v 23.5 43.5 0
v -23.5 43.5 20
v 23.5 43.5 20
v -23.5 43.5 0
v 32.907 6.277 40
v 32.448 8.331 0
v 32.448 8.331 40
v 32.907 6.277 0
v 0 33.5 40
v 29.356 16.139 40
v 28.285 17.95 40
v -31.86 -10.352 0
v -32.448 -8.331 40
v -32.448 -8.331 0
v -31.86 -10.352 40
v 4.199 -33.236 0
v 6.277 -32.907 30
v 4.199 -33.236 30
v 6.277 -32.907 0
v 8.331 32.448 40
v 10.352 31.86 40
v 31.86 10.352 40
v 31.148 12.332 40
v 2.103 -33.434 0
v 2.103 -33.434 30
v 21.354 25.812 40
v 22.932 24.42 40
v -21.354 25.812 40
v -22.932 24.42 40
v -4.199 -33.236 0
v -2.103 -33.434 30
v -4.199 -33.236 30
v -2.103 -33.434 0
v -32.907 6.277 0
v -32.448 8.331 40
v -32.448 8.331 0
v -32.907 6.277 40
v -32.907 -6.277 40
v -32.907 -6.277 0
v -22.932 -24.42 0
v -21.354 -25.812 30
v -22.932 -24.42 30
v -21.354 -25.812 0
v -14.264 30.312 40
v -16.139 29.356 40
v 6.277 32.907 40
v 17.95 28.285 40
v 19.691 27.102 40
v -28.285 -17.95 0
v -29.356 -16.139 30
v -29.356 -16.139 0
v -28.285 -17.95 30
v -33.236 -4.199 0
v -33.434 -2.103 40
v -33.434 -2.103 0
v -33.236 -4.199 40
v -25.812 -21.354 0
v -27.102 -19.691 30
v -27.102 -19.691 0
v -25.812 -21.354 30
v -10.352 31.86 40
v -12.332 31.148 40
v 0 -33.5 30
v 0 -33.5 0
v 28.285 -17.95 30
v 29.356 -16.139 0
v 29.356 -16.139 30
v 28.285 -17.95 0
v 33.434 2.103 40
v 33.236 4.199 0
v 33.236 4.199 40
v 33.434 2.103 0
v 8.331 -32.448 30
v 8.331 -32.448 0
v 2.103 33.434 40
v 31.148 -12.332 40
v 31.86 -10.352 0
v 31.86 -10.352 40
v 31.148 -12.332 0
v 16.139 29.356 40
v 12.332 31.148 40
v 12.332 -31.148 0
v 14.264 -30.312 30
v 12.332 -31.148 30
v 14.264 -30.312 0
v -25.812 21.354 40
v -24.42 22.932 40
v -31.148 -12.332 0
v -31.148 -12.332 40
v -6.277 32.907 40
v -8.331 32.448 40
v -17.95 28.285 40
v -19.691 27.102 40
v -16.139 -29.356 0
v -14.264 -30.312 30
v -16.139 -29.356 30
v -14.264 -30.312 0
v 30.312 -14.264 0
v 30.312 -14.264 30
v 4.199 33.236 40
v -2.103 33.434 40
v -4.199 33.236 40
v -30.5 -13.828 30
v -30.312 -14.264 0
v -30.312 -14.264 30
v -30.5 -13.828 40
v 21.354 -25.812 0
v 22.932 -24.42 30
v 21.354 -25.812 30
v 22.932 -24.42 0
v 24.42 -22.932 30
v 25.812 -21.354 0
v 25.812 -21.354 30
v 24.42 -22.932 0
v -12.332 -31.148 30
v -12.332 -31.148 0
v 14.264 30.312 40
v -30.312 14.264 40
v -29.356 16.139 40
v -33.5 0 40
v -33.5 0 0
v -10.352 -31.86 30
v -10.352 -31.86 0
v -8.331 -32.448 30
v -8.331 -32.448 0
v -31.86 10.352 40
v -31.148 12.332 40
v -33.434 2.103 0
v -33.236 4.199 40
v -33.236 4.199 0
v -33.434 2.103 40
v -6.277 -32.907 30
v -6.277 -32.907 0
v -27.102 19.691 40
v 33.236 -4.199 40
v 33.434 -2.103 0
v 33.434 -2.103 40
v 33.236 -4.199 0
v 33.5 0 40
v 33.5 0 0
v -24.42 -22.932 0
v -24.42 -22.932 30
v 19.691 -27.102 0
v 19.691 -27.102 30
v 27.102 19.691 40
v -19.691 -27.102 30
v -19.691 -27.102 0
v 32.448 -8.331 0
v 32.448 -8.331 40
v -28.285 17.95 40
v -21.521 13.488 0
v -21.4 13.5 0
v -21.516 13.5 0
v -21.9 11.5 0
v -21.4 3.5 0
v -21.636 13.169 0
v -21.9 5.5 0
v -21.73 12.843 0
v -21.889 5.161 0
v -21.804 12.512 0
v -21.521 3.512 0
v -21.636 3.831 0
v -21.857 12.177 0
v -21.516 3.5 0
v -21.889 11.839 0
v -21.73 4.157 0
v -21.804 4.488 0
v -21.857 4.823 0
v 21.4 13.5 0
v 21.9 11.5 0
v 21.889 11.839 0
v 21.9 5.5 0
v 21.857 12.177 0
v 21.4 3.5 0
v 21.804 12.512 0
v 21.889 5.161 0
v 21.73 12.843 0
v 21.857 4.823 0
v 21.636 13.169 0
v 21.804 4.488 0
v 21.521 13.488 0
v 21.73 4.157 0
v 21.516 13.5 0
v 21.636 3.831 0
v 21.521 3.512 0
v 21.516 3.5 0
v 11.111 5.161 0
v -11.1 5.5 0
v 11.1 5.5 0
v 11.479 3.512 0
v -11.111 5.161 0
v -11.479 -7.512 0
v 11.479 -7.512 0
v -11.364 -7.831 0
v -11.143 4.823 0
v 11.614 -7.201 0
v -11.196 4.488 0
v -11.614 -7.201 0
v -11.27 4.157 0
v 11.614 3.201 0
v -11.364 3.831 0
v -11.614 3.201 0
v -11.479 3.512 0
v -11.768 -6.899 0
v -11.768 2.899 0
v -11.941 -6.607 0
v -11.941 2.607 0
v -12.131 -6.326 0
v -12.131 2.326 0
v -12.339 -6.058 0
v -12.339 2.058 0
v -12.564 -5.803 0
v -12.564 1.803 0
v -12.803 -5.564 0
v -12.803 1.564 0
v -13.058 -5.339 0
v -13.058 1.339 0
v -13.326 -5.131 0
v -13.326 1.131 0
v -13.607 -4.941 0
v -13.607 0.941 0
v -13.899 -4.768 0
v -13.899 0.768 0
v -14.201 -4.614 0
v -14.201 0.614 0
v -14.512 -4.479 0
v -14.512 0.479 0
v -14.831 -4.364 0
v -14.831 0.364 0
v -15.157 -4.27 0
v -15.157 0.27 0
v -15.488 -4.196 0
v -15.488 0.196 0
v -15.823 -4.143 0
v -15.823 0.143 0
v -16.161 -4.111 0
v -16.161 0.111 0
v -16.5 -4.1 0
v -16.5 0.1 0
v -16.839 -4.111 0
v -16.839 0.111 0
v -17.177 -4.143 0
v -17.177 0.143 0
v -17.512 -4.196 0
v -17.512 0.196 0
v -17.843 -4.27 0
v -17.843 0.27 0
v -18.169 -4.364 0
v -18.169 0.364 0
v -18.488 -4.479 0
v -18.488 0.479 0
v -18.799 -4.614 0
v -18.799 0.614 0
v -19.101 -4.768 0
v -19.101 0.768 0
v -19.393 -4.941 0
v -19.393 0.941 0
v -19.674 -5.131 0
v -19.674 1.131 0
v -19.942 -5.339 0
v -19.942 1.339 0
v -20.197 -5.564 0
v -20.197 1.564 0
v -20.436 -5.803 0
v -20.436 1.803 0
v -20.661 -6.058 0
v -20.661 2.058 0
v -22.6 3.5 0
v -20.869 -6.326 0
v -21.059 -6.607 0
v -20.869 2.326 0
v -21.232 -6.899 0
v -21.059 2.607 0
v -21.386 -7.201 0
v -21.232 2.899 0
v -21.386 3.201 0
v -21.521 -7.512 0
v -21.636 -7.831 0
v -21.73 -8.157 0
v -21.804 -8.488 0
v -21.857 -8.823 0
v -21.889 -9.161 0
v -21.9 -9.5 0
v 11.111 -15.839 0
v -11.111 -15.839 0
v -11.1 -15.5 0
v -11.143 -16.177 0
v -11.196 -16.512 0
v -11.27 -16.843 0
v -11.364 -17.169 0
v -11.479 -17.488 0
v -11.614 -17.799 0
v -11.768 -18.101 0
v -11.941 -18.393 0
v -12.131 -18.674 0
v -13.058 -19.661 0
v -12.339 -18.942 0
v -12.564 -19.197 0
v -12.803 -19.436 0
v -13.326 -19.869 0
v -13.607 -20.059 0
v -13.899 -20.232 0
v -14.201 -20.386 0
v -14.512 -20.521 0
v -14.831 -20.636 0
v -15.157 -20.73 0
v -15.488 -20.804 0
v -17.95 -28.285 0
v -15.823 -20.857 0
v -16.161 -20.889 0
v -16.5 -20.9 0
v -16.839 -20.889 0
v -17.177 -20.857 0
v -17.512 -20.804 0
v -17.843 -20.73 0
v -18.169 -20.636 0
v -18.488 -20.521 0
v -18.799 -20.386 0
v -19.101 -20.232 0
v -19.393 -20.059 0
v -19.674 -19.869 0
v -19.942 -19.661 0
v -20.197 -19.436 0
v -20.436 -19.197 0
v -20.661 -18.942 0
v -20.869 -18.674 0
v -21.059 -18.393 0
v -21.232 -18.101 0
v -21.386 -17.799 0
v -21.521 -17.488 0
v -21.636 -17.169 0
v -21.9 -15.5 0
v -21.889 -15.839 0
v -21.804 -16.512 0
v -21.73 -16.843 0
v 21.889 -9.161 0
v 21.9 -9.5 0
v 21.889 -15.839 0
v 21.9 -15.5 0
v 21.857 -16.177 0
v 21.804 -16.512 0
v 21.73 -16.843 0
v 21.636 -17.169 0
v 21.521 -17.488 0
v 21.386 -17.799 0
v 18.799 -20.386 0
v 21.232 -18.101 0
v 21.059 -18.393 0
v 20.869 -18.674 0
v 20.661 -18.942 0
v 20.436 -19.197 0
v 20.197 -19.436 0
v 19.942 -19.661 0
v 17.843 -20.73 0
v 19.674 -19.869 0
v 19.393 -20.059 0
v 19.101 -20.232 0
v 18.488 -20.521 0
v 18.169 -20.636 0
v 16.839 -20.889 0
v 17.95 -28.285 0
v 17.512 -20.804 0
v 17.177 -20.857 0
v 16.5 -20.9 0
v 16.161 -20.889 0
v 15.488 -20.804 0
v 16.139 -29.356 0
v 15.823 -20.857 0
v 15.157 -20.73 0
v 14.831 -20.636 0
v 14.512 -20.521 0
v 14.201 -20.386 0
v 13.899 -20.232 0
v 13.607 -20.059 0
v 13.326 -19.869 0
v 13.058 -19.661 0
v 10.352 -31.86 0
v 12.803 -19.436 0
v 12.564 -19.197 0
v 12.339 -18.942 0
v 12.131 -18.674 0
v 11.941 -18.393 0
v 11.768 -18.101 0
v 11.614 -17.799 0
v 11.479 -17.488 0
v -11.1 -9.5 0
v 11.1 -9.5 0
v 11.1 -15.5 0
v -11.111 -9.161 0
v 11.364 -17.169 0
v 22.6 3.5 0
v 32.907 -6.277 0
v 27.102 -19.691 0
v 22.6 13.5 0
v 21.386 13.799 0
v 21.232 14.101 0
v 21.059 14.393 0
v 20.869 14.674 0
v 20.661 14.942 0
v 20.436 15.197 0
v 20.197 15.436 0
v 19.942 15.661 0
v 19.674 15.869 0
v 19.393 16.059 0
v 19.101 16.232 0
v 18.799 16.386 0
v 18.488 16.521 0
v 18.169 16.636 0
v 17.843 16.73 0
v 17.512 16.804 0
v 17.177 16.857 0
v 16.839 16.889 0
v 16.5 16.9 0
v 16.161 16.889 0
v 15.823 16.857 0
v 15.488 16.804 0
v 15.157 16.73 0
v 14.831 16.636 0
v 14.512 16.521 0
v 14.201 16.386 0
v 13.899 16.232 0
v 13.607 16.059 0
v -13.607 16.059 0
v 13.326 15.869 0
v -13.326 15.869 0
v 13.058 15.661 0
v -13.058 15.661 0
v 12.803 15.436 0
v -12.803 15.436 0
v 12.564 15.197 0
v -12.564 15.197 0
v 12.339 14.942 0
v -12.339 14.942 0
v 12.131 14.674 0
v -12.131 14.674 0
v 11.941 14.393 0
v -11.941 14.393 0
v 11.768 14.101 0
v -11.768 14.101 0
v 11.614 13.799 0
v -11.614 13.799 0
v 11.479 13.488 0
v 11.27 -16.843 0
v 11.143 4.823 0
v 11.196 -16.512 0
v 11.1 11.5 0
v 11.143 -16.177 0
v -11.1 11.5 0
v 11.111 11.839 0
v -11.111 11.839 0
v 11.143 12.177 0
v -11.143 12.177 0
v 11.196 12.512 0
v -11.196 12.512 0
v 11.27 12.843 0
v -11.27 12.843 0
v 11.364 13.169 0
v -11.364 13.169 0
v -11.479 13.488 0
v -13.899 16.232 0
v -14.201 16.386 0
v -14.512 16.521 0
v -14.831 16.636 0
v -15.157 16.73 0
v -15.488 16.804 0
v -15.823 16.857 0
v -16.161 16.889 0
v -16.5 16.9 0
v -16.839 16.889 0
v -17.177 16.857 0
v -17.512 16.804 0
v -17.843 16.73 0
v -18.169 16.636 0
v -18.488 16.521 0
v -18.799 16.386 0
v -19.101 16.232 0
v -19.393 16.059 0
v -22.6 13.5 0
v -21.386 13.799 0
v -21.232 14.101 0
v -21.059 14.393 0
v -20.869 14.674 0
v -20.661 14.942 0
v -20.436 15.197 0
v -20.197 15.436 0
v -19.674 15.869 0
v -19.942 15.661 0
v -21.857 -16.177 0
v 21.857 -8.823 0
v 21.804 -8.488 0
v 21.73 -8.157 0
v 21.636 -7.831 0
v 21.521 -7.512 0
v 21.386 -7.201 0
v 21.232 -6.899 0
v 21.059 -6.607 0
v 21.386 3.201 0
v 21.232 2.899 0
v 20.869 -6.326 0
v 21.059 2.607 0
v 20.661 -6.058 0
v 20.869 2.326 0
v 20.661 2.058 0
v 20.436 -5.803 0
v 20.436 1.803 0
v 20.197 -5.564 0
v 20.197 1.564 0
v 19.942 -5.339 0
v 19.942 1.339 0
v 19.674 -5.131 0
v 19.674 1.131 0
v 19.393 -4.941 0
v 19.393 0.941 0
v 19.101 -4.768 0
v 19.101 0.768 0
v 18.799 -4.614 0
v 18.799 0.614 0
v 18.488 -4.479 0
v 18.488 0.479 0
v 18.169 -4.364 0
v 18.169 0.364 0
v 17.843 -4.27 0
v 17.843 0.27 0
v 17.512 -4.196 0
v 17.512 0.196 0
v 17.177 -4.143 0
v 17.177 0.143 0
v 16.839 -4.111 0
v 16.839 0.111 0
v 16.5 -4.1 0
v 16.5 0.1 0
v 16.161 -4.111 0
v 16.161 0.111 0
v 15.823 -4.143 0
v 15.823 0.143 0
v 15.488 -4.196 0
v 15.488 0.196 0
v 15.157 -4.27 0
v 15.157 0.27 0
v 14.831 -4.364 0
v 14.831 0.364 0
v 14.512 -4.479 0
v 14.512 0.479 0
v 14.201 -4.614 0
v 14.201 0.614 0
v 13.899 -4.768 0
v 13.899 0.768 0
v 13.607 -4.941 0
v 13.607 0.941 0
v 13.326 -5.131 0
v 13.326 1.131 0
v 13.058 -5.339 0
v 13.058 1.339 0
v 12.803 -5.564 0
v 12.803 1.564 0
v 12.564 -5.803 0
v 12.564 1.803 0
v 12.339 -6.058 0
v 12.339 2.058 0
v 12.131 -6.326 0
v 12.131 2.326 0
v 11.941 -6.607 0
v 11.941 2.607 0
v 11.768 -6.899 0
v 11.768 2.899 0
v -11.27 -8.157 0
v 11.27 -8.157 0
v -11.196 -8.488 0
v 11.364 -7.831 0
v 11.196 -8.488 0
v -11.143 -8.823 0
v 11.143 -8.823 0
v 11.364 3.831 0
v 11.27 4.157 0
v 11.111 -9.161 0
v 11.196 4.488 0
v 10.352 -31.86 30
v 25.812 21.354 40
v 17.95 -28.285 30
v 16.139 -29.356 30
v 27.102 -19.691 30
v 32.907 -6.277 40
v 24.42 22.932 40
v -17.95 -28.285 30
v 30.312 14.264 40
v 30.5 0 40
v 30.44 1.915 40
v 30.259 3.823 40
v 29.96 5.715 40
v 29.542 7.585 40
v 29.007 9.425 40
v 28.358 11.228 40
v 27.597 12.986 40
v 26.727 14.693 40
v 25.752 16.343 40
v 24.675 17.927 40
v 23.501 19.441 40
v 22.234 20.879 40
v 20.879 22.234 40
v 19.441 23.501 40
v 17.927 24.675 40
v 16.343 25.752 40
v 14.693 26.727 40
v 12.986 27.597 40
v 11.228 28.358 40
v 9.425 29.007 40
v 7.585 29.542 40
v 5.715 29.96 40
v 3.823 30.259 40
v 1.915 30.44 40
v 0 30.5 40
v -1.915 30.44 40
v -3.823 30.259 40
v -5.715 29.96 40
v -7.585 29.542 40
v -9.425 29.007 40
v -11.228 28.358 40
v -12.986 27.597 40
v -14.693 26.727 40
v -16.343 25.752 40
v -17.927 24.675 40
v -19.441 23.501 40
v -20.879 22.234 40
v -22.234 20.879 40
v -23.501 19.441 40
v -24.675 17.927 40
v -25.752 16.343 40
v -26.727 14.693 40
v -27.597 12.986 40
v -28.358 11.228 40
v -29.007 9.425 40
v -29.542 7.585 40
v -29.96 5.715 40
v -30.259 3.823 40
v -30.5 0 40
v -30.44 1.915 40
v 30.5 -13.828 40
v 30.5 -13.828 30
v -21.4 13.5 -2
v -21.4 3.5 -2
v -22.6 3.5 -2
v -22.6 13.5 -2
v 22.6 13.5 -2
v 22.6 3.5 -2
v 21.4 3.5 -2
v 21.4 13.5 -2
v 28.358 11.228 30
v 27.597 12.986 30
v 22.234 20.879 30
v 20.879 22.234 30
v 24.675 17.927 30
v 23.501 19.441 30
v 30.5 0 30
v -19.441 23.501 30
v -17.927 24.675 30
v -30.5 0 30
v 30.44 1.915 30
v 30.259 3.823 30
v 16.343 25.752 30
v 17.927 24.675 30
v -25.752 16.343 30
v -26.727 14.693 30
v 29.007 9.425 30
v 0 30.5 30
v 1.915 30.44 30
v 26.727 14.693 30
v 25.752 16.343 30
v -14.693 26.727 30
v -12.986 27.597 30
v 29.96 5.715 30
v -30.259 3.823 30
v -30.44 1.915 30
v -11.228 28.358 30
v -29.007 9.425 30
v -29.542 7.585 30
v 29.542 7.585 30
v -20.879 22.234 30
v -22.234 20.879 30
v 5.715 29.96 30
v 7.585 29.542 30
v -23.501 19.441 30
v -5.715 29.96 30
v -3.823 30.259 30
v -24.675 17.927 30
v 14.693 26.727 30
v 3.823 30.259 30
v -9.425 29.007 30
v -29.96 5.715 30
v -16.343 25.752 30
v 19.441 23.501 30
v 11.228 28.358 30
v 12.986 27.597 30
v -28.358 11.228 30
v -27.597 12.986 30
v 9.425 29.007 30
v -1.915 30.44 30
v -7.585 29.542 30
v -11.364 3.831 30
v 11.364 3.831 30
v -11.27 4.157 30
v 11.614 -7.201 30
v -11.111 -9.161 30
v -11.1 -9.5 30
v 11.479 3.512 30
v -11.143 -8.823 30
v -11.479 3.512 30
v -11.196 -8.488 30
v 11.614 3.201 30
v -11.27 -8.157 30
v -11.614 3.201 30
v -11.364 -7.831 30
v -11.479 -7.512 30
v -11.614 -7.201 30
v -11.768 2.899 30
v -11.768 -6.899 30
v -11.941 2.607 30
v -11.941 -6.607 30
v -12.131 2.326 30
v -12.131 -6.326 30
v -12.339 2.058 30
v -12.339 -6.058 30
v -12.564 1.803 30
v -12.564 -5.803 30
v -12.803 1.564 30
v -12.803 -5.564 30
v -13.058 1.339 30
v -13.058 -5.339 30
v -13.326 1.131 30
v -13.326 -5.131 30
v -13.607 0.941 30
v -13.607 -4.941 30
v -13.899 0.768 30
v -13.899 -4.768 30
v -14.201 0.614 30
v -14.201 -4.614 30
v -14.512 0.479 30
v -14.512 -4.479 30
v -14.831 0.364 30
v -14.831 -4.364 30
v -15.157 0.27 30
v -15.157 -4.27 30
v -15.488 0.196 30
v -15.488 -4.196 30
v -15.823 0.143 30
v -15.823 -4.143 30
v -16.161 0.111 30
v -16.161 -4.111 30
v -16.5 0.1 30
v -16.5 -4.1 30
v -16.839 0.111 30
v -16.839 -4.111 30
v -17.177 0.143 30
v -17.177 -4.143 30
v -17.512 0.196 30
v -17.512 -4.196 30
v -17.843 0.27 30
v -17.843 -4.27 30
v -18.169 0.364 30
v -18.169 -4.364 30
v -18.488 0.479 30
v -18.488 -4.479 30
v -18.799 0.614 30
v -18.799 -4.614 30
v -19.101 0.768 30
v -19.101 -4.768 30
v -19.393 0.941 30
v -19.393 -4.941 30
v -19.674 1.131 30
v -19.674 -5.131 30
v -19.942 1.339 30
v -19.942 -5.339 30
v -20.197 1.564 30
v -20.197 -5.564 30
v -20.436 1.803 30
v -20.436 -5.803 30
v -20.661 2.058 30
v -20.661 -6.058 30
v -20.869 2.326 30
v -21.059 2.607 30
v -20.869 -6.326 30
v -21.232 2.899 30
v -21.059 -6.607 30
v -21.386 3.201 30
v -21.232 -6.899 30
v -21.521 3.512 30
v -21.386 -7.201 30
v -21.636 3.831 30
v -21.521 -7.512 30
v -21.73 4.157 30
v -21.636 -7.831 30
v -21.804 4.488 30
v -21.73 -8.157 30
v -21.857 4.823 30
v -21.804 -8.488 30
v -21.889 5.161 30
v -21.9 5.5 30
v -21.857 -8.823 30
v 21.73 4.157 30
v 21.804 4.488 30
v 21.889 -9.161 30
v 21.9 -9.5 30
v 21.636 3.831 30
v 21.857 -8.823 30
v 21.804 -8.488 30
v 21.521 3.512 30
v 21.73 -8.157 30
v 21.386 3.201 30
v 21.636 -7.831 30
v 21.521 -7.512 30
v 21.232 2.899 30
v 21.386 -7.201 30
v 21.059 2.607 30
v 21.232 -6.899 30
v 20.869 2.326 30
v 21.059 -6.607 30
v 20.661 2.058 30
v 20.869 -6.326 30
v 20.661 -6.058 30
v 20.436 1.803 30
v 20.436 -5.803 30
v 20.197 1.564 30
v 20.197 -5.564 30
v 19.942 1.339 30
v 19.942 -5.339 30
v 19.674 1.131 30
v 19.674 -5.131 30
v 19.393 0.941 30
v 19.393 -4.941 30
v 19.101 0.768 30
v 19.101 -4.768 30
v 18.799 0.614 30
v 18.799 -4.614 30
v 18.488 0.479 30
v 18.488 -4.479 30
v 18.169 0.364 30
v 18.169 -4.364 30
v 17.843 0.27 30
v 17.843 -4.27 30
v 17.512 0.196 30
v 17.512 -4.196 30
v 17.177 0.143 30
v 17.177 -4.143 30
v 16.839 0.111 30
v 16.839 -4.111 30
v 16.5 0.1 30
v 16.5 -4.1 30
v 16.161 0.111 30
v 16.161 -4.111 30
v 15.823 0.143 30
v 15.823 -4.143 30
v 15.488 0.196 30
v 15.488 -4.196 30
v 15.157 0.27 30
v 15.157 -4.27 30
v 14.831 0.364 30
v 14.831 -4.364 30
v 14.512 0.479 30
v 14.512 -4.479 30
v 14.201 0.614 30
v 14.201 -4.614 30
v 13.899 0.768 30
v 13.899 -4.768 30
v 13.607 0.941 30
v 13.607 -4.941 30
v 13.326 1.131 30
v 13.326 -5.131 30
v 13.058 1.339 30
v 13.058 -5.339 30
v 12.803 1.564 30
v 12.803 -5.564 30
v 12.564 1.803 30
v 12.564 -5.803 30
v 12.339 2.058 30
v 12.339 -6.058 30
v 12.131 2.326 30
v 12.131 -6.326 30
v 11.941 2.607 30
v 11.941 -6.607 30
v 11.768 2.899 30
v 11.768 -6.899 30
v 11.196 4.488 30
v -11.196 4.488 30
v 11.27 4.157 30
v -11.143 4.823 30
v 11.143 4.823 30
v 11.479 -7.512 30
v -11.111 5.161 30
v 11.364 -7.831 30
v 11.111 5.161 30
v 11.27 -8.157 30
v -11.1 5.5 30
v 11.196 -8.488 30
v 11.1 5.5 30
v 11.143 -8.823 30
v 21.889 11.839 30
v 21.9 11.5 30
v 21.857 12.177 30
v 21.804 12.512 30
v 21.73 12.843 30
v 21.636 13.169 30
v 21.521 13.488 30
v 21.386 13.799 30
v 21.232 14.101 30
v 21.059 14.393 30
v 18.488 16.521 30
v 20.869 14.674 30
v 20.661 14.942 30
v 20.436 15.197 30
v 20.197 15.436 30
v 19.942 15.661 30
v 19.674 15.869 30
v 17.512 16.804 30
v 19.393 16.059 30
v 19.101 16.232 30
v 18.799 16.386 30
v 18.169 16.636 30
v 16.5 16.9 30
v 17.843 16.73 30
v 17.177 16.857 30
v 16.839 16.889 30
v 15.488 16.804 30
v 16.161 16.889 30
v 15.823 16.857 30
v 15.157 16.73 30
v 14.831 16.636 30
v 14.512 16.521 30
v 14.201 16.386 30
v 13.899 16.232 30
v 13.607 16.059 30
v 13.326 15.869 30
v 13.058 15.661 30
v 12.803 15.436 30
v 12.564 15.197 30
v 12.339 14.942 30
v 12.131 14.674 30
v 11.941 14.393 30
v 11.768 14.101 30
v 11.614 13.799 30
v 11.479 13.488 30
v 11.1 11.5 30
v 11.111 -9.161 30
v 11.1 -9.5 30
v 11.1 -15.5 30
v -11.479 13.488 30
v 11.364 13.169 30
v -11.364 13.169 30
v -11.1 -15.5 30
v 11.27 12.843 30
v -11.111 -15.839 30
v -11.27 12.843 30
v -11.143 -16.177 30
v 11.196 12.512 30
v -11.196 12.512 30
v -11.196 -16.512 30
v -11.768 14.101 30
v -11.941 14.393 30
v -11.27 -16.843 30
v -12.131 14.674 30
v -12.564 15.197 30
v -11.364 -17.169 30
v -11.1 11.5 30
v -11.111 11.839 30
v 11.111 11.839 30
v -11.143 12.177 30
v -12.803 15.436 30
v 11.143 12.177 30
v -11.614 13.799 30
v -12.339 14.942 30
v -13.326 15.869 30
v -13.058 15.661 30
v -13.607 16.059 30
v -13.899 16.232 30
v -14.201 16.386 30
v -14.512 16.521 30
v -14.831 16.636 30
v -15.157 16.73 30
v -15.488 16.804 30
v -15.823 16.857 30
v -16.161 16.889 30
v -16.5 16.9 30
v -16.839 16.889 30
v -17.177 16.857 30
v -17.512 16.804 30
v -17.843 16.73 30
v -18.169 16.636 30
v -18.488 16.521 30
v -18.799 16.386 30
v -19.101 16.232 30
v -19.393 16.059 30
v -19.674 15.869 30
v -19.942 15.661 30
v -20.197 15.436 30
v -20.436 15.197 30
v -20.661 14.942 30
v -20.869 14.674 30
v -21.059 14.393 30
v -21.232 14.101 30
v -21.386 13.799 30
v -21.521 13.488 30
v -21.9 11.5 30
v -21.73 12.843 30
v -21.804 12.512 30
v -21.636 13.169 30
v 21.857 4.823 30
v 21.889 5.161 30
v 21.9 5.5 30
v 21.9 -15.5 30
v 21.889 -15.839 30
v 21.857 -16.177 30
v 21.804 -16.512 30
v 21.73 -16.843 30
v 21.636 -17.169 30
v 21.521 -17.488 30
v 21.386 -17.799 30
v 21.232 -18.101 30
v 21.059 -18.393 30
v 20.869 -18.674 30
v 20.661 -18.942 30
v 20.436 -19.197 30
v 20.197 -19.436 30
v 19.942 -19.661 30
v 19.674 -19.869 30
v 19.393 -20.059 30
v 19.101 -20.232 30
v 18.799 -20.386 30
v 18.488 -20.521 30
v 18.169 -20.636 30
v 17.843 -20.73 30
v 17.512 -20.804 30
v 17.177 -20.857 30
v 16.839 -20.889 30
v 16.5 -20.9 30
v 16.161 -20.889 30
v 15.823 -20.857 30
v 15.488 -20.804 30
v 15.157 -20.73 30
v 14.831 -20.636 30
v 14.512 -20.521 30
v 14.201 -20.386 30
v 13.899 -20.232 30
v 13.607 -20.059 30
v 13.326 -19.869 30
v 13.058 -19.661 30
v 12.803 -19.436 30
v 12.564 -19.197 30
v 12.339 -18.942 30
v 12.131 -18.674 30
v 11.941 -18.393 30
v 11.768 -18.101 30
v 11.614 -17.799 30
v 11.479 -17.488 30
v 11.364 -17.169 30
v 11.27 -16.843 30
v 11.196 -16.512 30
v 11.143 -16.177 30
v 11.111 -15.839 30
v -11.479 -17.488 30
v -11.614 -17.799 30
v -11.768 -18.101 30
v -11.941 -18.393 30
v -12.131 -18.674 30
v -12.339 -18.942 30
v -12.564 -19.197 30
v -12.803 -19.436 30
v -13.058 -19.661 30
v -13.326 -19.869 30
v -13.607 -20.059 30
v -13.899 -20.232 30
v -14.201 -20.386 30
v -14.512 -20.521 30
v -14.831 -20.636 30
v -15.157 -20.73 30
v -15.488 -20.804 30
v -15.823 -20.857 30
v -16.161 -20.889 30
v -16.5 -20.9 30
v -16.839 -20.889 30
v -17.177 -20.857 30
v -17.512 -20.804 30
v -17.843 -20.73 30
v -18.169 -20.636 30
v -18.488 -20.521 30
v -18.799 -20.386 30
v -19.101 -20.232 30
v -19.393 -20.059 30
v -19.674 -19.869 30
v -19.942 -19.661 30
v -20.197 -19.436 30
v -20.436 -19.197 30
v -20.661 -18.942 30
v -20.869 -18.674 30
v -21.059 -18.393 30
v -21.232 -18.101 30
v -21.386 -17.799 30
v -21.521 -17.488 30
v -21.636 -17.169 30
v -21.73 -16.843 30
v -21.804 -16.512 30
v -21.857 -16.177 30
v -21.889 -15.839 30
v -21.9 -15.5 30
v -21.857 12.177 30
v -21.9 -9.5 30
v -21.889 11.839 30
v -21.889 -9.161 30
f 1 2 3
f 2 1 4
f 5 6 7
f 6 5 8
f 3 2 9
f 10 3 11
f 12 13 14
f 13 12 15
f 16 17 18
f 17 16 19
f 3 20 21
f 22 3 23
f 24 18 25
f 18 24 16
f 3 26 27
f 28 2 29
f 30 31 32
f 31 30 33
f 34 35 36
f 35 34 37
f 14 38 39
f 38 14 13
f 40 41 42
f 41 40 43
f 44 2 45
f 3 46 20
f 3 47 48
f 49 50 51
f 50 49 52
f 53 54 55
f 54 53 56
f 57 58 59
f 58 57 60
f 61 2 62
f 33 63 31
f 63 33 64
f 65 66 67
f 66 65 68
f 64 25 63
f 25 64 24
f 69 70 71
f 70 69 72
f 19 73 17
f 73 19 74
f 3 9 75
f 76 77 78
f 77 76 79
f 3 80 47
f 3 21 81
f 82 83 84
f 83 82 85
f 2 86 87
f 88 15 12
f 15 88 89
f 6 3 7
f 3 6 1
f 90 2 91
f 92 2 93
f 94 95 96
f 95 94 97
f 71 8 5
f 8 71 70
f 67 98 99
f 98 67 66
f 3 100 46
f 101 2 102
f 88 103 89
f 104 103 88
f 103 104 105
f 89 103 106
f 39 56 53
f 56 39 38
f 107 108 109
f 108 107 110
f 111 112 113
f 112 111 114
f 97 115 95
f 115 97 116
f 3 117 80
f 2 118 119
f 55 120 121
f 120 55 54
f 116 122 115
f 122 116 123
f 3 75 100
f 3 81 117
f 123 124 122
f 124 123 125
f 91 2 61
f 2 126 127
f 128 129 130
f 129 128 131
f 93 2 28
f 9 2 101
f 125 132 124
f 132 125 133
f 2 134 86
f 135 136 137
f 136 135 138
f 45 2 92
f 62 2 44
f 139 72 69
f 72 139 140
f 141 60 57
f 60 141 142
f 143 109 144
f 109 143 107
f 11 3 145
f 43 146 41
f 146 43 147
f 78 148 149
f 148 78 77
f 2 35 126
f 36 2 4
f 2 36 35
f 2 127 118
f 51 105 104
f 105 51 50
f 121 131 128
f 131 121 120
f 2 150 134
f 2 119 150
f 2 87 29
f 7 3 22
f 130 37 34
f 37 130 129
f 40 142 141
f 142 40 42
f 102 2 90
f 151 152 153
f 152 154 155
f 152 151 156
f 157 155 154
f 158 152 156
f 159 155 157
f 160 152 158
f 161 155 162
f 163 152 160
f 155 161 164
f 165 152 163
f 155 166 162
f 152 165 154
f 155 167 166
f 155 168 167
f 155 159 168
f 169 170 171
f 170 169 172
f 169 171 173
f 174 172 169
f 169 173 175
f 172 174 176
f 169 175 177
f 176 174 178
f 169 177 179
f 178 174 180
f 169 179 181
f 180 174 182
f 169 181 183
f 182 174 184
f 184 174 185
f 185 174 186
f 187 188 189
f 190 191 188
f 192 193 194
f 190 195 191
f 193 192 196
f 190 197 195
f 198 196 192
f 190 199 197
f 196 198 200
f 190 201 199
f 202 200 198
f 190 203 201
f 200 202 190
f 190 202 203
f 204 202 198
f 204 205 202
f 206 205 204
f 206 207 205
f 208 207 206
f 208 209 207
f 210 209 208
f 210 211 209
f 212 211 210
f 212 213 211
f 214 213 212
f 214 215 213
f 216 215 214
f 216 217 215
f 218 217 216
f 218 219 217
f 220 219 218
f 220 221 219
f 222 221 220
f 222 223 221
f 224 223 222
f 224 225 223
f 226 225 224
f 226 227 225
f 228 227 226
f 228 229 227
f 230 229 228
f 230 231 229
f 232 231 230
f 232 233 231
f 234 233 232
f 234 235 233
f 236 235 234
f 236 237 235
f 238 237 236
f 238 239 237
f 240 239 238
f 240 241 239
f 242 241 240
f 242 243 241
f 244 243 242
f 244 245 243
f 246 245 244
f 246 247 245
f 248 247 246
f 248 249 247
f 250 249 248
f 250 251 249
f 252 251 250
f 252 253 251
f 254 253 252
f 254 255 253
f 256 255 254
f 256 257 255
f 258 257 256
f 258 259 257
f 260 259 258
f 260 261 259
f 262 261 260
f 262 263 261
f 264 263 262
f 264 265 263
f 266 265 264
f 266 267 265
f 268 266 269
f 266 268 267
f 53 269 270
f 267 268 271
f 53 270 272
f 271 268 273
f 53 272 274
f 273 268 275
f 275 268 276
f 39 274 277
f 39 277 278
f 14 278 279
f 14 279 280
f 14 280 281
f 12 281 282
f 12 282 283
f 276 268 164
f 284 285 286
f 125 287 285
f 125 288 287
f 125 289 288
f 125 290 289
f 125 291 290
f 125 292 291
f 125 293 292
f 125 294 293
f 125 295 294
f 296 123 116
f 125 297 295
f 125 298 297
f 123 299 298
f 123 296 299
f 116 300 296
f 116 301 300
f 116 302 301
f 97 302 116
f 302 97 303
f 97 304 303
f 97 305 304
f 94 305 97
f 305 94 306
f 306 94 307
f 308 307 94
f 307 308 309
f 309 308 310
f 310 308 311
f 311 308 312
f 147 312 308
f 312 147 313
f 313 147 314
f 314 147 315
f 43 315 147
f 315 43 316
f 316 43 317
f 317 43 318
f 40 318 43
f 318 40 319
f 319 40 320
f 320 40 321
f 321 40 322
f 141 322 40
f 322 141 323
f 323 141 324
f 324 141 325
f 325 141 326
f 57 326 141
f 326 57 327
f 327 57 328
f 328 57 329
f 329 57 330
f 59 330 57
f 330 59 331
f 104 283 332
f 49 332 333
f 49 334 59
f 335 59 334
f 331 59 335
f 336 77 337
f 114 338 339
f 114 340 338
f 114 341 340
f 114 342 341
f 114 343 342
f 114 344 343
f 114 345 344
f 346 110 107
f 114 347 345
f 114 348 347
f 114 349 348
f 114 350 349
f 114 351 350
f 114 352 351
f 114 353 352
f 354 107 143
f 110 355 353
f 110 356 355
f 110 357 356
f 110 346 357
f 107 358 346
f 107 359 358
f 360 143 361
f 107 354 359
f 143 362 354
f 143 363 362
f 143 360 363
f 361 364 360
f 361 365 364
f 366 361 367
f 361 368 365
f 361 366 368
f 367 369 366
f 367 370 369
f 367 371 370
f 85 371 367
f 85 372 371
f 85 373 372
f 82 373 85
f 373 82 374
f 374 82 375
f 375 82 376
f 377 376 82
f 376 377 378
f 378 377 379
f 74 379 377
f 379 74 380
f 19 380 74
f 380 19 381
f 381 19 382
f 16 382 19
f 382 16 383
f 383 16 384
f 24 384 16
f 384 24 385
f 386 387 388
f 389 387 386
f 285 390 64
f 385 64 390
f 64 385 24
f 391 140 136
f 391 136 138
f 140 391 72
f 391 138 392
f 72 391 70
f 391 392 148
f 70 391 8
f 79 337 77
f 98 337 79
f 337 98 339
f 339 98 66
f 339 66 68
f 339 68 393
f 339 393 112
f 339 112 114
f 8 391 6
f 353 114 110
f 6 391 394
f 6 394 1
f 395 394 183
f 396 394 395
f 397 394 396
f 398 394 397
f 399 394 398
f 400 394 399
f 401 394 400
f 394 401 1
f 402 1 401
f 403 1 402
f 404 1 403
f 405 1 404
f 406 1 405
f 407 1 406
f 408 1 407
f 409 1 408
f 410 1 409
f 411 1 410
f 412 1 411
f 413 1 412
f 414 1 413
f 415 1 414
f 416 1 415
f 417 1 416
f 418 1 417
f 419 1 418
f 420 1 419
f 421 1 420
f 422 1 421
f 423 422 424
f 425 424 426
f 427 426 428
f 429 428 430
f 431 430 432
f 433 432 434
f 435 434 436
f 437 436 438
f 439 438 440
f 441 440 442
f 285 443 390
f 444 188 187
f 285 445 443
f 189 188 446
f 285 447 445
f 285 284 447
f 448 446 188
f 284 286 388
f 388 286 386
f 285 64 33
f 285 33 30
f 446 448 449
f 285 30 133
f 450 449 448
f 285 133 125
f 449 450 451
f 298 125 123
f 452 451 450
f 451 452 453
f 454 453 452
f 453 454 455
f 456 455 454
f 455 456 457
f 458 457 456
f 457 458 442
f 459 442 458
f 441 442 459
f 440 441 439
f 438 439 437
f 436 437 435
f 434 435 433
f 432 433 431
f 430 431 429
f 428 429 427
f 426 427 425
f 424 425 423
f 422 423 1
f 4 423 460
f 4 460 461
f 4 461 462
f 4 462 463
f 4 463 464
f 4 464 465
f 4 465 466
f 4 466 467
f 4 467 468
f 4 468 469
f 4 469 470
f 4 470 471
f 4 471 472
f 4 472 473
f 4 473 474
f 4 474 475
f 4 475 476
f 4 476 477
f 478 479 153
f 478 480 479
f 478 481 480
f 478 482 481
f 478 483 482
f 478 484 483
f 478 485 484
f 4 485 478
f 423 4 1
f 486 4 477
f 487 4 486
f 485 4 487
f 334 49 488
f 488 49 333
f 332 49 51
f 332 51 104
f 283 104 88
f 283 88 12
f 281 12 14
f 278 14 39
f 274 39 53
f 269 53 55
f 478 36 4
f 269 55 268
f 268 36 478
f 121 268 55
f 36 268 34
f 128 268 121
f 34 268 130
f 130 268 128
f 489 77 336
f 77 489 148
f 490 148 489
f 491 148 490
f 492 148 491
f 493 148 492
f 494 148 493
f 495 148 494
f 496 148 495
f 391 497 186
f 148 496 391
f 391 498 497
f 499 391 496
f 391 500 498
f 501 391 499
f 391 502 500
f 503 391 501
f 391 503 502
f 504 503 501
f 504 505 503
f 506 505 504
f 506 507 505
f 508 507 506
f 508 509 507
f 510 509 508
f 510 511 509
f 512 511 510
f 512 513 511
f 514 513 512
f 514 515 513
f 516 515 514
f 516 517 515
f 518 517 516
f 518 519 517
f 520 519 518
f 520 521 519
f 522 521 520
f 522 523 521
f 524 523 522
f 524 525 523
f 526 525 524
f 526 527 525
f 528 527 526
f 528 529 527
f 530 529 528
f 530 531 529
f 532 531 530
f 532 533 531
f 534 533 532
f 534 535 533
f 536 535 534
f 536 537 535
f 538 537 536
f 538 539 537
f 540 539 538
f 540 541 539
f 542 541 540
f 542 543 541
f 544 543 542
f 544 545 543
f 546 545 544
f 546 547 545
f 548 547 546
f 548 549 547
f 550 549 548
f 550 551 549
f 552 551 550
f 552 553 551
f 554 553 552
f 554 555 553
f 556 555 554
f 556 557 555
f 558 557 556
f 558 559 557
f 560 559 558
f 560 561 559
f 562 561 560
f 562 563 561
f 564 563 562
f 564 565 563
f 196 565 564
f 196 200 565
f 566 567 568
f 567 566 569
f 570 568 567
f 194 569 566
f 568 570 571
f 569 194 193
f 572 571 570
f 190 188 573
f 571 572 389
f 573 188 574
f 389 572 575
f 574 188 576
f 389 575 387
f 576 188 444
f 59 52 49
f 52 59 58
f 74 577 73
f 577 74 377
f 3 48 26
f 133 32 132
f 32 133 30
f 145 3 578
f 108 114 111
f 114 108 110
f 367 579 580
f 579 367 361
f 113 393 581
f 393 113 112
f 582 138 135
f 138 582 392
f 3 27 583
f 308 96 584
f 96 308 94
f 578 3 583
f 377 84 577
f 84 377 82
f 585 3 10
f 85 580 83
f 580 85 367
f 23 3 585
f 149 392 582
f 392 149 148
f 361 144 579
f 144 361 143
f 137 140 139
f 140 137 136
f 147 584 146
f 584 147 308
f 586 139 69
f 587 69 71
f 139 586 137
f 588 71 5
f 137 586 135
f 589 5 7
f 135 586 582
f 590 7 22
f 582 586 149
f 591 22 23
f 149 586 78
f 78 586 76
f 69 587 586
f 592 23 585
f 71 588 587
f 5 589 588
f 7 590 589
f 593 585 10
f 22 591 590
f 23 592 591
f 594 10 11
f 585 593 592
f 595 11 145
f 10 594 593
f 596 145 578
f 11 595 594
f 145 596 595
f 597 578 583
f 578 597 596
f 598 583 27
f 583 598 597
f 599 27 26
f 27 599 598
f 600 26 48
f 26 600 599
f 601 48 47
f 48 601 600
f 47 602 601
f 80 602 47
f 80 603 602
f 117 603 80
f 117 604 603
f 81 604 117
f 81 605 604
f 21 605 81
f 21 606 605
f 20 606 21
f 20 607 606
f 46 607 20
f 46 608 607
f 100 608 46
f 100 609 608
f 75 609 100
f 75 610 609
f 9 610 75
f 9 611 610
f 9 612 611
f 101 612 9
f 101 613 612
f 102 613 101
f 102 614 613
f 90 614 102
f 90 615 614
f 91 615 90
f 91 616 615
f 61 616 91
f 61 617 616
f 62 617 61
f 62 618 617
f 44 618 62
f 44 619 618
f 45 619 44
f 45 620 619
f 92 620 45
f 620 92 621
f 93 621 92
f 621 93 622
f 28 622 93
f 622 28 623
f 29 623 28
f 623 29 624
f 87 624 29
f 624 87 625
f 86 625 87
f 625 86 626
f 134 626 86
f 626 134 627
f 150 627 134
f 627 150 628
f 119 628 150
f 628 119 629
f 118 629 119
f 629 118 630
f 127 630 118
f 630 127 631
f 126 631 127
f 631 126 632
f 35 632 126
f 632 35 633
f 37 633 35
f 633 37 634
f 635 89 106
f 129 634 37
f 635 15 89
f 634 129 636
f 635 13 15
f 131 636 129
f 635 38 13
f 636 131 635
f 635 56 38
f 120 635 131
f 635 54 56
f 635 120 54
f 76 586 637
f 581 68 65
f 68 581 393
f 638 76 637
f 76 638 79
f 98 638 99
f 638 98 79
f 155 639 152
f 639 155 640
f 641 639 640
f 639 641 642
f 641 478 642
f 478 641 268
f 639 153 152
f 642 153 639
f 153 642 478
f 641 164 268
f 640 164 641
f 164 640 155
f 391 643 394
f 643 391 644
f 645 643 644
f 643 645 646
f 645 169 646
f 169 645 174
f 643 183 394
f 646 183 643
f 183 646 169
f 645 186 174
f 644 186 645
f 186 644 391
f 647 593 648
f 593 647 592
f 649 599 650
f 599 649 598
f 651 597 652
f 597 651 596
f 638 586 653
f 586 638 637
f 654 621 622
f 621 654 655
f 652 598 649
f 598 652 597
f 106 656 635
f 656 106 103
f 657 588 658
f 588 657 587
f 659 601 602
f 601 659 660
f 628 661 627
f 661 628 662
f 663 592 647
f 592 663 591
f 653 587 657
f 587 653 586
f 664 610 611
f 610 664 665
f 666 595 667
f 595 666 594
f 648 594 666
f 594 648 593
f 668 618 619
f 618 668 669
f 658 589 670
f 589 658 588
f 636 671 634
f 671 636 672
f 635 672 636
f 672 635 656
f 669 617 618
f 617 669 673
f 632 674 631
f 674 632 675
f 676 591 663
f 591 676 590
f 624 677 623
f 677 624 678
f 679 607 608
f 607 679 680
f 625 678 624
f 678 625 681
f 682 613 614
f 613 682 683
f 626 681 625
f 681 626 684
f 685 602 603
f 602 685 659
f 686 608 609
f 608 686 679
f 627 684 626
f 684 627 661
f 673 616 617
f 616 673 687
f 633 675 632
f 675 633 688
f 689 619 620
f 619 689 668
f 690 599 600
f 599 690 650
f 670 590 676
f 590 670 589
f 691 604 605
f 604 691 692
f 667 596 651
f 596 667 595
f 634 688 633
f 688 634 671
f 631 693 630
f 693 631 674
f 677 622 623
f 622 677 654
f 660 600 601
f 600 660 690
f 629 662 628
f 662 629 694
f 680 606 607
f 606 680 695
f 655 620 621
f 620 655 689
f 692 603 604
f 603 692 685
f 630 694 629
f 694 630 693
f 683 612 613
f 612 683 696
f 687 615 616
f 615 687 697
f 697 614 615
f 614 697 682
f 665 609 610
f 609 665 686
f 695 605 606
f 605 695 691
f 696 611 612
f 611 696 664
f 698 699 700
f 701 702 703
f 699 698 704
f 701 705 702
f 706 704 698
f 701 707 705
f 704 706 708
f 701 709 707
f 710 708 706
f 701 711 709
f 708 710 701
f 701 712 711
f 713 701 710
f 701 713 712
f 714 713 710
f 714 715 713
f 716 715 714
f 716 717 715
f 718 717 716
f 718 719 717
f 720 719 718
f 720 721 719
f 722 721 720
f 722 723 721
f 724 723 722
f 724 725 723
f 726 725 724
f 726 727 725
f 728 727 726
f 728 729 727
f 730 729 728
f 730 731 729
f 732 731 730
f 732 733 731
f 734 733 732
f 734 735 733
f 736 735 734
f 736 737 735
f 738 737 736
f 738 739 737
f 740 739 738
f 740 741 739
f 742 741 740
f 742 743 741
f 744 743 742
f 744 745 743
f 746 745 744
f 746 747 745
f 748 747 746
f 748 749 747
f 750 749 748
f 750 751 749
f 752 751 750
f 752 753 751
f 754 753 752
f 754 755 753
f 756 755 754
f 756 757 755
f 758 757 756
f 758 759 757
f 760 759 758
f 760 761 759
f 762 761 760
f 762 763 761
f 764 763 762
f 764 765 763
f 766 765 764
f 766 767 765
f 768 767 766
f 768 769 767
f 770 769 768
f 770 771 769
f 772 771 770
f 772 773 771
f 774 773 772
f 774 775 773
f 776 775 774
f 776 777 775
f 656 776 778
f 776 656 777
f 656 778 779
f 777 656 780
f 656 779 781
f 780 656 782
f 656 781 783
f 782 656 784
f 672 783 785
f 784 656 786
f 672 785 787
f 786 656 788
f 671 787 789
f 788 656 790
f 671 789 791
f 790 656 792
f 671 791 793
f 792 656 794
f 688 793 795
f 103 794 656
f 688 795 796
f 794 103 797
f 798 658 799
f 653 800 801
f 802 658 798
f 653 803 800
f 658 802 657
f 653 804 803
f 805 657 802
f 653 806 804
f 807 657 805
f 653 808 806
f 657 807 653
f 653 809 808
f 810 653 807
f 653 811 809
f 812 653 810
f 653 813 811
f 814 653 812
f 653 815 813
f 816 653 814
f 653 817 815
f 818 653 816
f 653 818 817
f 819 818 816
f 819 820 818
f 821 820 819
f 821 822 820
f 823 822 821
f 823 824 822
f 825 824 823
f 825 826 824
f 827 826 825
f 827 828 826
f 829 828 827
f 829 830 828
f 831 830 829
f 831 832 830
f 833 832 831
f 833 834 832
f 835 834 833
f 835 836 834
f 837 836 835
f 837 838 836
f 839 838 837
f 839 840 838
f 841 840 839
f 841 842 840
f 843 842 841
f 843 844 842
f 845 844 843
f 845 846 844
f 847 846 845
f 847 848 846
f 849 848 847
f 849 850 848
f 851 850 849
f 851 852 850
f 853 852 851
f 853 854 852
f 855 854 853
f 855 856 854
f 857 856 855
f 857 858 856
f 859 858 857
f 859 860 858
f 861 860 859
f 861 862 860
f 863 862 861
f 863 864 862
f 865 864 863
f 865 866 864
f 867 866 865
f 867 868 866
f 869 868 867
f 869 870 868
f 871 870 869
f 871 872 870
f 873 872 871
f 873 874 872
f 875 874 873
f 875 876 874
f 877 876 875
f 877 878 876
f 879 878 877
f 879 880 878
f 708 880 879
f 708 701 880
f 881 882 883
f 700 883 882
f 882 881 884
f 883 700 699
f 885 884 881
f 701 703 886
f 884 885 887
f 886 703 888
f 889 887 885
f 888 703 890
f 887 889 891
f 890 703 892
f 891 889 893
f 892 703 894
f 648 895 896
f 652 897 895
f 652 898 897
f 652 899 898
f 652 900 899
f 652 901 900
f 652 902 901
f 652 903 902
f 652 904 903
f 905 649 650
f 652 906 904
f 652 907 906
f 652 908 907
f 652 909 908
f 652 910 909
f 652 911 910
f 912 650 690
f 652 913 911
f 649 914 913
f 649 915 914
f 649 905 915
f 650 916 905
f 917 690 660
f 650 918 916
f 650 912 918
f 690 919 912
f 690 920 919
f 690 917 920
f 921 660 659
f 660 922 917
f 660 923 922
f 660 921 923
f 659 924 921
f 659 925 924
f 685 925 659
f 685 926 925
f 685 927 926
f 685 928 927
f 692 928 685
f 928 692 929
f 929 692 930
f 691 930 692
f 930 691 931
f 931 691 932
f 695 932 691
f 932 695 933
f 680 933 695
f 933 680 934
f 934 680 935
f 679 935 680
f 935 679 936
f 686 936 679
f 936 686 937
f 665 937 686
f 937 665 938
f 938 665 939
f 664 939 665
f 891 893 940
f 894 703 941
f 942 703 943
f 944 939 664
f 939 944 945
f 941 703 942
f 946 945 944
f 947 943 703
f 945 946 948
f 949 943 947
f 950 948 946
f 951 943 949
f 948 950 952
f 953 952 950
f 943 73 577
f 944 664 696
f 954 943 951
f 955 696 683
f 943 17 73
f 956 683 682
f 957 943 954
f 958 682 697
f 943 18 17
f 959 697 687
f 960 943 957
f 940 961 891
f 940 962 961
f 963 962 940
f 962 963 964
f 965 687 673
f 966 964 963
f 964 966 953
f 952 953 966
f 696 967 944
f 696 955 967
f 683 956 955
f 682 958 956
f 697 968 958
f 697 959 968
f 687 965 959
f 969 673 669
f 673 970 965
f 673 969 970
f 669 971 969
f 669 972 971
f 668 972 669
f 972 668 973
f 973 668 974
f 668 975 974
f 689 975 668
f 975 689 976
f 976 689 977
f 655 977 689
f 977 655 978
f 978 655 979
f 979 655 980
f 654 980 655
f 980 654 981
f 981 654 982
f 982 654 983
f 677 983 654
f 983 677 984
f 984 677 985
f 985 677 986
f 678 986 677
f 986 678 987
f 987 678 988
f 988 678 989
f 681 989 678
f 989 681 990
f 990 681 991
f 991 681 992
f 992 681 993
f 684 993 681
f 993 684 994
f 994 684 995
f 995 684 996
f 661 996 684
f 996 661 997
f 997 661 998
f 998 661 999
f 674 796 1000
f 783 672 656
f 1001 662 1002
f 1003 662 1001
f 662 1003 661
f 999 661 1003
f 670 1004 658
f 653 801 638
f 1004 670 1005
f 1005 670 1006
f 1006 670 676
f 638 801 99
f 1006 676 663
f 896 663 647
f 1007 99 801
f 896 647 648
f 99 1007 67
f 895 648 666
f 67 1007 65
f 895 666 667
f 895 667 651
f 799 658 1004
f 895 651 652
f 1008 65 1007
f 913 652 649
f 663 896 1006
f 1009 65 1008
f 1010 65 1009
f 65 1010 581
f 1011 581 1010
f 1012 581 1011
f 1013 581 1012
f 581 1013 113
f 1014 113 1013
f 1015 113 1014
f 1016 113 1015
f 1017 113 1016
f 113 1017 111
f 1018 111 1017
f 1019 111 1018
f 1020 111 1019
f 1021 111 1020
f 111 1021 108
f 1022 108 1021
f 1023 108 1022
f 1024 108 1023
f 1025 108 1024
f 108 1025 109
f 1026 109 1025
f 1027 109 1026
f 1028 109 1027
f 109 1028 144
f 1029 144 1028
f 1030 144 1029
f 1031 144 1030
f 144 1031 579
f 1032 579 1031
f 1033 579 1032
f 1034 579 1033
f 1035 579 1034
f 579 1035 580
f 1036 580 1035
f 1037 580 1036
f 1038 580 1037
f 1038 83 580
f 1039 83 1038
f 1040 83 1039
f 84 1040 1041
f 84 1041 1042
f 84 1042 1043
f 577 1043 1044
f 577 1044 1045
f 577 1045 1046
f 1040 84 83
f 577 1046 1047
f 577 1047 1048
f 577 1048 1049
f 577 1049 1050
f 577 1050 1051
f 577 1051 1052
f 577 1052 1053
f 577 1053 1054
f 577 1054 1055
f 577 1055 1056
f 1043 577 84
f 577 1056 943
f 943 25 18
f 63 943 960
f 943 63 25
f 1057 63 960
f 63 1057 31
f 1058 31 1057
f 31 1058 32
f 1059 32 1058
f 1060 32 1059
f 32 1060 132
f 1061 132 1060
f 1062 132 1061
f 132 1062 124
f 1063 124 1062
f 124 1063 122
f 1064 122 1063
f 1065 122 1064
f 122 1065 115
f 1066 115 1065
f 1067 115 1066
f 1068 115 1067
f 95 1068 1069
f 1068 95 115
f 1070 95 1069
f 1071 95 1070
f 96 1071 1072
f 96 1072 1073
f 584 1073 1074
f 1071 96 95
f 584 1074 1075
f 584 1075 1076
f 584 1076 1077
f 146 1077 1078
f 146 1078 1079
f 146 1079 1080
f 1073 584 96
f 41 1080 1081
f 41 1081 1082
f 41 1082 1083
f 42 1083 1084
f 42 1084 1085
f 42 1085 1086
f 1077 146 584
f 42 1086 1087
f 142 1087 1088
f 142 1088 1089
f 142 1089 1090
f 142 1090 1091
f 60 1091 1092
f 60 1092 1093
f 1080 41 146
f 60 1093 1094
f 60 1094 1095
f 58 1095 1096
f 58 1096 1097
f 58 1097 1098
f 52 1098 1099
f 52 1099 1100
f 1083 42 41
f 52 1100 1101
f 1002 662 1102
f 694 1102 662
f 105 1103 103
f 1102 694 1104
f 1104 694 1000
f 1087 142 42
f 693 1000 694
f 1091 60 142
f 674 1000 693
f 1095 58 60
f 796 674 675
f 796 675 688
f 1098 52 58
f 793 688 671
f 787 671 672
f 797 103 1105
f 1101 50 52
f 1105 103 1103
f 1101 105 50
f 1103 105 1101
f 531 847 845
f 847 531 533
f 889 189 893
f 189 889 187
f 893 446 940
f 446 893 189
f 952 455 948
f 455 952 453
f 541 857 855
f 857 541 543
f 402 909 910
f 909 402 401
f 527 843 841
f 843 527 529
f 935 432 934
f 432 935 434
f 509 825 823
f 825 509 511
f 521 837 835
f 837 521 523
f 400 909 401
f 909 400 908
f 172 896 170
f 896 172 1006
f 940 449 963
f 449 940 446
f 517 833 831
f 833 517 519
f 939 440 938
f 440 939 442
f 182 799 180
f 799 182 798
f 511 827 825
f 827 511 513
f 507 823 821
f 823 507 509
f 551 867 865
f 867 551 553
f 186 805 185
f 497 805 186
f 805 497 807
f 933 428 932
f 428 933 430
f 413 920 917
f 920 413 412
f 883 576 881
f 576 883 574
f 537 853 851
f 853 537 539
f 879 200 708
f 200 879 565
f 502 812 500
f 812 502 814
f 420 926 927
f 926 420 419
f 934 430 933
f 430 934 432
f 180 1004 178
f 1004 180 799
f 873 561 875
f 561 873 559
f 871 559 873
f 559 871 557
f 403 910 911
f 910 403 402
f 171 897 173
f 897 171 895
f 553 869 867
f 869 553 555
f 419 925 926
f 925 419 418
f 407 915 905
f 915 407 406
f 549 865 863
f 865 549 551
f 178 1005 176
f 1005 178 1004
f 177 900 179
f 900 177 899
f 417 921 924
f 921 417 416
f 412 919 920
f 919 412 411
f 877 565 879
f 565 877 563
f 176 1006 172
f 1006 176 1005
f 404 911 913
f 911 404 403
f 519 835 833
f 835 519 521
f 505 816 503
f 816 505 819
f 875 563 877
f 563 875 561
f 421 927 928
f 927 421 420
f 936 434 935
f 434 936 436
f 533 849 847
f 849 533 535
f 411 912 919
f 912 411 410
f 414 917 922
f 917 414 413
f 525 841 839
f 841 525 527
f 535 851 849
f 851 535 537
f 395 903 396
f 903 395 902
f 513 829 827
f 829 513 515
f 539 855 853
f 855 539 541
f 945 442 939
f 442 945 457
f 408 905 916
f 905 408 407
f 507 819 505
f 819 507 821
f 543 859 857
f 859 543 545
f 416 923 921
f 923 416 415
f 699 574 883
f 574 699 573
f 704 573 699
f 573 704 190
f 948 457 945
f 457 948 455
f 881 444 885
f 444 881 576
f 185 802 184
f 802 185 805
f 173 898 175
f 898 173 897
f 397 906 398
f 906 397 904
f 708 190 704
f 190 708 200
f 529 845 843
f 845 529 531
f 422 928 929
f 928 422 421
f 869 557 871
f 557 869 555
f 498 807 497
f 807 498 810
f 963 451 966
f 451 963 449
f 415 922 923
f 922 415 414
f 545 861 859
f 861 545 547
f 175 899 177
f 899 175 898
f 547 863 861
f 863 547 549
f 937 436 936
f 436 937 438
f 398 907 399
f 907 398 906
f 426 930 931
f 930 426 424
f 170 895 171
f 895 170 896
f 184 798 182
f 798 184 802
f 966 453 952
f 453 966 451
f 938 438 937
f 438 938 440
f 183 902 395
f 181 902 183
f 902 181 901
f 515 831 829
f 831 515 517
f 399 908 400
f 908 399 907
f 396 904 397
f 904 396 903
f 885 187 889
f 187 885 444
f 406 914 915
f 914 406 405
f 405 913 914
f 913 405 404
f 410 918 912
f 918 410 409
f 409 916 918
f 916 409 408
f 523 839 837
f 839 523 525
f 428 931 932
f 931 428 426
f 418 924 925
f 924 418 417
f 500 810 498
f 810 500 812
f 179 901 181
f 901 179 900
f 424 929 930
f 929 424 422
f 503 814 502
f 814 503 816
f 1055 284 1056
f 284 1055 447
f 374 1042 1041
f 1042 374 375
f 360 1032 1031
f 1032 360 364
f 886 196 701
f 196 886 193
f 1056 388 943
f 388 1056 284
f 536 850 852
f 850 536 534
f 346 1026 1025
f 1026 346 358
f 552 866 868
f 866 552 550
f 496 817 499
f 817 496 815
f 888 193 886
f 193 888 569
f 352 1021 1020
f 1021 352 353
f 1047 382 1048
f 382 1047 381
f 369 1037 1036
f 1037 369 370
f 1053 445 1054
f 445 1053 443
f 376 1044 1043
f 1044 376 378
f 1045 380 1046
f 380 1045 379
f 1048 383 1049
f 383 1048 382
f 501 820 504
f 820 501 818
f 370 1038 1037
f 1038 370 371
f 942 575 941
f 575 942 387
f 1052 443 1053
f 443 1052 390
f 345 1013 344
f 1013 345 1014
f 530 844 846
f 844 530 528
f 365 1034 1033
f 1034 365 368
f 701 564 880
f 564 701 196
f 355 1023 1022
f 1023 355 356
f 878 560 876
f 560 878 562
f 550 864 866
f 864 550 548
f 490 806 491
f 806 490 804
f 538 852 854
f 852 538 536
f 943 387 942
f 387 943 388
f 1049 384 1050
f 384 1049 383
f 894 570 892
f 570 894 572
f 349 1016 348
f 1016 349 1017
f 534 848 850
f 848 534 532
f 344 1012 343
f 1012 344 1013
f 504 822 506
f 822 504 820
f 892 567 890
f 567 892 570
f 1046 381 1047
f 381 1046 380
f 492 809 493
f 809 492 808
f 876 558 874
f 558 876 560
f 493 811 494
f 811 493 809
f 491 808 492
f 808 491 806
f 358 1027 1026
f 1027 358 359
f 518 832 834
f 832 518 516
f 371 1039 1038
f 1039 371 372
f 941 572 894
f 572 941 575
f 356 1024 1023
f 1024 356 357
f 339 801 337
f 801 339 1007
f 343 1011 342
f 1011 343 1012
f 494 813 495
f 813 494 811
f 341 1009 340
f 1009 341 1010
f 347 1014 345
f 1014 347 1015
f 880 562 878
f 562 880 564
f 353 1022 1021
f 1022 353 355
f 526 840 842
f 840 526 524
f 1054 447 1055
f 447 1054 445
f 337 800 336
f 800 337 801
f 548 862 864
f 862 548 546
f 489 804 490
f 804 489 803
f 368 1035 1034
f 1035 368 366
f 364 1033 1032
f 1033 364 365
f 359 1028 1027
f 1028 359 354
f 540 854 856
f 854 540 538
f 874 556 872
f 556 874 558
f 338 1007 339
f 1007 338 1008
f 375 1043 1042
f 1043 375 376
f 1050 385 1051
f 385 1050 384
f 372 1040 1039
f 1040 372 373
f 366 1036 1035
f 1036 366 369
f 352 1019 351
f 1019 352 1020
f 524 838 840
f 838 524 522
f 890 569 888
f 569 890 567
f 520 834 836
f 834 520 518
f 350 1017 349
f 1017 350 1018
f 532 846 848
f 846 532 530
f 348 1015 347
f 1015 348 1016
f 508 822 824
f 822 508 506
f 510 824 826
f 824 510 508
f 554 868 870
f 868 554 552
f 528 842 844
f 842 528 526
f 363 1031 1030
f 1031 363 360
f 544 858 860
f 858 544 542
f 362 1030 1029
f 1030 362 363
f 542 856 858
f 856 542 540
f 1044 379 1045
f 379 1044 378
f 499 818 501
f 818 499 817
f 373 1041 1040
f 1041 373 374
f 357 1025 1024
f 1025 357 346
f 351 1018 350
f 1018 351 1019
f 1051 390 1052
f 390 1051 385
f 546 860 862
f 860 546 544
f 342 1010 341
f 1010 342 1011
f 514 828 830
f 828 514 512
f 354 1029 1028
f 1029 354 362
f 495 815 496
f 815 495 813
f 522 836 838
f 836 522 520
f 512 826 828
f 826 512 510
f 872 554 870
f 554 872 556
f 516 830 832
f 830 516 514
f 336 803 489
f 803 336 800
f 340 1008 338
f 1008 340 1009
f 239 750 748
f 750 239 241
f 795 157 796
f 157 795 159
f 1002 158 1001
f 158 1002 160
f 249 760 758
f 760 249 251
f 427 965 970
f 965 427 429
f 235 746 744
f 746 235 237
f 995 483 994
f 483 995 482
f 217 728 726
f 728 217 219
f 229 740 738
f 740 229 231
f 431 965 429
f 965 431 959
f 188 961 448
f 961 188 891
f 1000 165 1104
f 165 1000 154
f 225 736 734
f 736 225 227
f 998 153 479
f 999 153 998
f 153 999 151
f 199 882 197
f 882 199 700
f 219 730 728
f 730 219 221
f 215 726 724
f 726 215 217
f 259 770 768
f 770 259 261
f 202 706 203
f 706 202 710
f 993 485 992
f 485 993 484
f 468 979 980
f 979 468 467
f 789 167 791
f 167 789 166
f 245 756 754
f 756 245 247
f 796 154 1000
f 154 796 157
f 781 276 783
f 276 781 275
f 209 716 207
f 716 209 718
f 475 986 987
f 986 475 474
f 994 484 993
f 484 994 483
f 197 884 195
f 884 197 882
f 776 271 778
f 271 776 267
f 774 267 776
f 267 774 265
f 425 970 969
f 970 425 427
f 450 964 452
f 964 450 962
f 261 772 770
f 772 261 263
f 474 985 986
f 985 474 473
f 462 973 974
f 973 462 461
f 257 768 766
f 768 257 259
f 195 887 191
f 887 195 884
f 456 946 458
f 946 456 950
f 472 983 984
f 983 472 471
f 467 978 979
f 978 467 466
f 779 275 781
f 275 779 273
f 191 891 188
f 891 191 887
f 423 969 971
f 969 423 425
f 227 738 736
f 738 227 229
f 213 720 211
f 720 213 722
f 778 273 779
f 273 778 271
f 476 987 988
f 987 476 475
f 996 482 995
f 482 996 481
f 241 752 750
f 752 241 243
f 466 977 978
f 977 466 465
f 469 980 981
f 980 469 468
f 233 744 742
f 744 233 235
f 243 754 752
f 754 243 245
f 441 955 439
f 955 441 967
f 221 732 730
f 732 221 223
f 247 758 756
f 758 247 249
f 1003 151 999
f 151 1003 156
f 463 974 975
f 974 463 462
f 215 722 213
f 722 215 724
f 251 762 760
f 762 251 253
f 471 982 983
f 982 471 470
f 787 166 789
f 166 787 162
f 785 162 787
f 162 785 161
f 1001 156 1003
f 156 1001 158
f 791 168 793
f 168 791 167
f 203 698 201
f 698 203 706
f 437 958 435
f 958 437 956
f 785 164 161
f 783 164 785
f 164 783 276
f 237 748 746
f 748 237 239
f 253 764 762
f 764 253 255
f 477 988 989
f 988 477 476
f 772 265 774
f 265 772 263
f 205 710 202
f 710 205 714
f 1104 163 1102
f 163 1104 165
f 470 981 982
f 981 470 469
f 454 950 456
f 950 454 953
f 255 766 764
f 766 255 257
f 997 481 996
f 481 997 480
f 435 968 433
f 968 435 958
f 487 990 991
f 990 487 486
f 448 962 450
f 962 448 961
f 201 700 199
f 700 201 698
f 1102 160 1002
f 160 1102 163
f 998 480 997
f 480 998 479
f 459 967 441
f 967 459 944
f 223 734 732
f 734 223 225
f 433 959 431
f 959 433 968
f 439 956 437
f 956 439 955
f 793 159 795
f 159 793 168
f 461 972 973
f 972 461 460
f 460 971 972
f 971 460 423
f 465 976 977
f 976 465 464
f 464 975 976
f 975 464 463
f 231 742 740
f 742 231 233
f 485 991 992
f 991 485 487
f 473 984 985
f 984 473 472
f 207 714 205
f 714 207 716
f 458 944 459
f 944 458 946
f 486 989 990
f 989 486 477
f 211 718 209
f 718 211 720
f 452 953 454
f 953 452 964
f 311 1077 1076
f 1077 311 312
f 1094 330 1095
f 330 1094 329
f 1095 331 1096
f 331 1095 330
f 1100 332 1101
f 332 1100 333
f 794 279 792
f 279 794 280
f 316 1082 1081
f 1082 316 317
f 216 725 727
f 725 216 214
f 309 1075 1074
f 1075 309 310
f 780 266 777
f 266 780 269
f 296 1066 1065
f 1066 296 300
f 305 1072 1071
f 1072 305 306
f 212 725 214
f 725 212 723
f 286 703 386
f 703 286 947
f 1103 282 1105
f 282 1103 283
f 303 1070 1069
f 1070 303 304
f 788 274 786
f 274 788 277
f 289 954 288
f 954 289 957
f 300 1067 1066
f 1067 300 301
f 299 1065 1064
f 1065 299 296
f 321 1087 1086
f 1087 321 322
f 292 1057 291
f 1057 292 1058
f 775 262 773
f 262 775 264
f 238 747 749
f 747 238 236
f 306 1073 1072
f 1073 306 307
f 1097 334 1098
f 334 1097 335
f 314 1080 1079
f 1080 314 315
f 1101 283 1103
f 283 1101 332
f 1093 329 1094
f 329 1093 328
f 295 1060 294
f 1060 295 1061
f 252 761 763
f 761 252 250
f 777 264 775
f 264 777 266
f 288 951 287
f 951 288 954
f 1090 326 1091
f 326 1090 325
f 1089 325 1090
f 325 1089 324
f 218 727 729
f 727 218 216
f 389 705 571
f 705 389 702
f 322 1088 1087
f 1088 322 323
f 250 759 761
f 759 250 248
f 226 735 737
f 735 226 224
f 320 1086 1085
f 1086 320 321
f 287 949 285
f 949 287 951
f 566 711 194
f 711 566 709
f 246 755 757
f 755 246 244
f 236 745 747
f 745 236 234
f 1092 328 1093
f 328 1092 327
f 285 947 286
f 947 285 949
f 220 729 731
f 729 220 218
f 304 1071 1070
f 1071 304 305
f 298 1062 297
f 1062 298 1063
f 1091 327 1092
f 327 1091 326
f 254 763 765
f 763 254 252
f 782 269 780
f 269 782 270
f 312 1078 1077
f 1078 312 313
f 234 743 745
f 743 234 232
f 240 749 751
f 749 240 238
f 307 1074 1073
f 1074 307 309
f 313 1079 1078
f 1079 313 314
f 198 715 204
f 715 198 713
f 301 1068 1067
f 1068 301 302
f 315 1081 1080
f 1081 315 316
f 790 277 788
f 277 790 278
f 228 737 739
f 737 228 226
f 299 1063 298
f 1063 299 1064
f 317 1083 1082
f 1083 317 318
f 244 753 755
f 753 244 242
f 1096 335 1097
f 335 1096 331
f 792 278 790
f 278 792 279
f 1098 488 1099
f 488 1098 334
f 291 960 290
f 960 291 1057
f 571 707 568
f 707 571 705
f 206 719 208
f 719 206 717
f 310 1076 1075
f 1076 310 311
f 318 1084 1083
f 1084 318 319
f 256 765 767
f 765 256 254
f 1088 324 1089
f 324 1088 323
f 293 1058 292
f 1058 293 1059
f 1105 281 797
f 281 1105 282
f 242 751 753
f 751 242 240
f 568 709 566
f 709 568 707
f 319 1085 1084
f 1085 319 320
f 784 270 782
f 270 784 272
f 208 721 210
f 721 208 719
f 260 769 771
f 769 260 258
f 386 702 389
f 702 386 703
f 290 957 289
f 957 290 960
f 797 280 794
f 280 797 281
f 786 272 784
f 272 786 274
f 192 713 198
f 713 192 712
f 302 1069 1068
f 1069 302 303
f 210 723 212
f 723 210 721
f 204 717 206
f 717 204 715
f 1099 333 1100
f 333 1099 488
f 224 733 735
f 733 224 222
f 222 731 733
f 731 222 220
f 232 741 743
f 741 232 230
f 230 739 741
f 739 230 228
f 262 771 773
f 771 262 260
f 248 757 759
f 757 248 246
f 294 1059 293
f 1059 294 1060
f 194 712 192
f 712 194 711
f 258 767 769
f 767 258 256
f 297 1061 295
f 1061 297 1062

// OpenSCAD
tassendm = 61;

hoehe = 30;
abstand = 13;

rand = 3;
randhoehe = 10;

lochdm = 12-1.2;

breite = tassendm + 2*rand;

$fn=100;


difference() {
koerper();
translate([0,0,hoehe])
   hull() { cylinder(d=tassendm, h=randhoehe); translate([0,-tassendm,0]) cylinder(d=tassendm, h=randhoehe); }
  translate([16.5,tassendm/2+abstand-32,0]) lloch();
  translate([16.5,tassendm/2+abstand-32-21,0]) lloch();
  translate([-16.5,tassendm/2+abstand-32,0]) lloch();
  translate([-16.5,tassendm/2+abstand-32-21,0]) lloch();
}


module lloch() {
    hull() {cylinder(d=lochdm, h=hoehe+randhoehe); translate([0,-6,0])cylinder(d=lochdm, h=hoehe+randhoehe); }
}


module koerper() {
union() {
hull() {
translate([-breite/2+10,tassendm/2,0]) cube([breite-20,abstand,hoehe-10]);
cylinder(d=breite, h=hoehe+randhoehe);
}
translate([-22-0.6,tassendm/2+abstand-40,-2]) cube([1.2,10,2]);
translate([22-0.6,tassendm/2+abstand-40,-2]) cube([1.2,10,2]);
}
}
